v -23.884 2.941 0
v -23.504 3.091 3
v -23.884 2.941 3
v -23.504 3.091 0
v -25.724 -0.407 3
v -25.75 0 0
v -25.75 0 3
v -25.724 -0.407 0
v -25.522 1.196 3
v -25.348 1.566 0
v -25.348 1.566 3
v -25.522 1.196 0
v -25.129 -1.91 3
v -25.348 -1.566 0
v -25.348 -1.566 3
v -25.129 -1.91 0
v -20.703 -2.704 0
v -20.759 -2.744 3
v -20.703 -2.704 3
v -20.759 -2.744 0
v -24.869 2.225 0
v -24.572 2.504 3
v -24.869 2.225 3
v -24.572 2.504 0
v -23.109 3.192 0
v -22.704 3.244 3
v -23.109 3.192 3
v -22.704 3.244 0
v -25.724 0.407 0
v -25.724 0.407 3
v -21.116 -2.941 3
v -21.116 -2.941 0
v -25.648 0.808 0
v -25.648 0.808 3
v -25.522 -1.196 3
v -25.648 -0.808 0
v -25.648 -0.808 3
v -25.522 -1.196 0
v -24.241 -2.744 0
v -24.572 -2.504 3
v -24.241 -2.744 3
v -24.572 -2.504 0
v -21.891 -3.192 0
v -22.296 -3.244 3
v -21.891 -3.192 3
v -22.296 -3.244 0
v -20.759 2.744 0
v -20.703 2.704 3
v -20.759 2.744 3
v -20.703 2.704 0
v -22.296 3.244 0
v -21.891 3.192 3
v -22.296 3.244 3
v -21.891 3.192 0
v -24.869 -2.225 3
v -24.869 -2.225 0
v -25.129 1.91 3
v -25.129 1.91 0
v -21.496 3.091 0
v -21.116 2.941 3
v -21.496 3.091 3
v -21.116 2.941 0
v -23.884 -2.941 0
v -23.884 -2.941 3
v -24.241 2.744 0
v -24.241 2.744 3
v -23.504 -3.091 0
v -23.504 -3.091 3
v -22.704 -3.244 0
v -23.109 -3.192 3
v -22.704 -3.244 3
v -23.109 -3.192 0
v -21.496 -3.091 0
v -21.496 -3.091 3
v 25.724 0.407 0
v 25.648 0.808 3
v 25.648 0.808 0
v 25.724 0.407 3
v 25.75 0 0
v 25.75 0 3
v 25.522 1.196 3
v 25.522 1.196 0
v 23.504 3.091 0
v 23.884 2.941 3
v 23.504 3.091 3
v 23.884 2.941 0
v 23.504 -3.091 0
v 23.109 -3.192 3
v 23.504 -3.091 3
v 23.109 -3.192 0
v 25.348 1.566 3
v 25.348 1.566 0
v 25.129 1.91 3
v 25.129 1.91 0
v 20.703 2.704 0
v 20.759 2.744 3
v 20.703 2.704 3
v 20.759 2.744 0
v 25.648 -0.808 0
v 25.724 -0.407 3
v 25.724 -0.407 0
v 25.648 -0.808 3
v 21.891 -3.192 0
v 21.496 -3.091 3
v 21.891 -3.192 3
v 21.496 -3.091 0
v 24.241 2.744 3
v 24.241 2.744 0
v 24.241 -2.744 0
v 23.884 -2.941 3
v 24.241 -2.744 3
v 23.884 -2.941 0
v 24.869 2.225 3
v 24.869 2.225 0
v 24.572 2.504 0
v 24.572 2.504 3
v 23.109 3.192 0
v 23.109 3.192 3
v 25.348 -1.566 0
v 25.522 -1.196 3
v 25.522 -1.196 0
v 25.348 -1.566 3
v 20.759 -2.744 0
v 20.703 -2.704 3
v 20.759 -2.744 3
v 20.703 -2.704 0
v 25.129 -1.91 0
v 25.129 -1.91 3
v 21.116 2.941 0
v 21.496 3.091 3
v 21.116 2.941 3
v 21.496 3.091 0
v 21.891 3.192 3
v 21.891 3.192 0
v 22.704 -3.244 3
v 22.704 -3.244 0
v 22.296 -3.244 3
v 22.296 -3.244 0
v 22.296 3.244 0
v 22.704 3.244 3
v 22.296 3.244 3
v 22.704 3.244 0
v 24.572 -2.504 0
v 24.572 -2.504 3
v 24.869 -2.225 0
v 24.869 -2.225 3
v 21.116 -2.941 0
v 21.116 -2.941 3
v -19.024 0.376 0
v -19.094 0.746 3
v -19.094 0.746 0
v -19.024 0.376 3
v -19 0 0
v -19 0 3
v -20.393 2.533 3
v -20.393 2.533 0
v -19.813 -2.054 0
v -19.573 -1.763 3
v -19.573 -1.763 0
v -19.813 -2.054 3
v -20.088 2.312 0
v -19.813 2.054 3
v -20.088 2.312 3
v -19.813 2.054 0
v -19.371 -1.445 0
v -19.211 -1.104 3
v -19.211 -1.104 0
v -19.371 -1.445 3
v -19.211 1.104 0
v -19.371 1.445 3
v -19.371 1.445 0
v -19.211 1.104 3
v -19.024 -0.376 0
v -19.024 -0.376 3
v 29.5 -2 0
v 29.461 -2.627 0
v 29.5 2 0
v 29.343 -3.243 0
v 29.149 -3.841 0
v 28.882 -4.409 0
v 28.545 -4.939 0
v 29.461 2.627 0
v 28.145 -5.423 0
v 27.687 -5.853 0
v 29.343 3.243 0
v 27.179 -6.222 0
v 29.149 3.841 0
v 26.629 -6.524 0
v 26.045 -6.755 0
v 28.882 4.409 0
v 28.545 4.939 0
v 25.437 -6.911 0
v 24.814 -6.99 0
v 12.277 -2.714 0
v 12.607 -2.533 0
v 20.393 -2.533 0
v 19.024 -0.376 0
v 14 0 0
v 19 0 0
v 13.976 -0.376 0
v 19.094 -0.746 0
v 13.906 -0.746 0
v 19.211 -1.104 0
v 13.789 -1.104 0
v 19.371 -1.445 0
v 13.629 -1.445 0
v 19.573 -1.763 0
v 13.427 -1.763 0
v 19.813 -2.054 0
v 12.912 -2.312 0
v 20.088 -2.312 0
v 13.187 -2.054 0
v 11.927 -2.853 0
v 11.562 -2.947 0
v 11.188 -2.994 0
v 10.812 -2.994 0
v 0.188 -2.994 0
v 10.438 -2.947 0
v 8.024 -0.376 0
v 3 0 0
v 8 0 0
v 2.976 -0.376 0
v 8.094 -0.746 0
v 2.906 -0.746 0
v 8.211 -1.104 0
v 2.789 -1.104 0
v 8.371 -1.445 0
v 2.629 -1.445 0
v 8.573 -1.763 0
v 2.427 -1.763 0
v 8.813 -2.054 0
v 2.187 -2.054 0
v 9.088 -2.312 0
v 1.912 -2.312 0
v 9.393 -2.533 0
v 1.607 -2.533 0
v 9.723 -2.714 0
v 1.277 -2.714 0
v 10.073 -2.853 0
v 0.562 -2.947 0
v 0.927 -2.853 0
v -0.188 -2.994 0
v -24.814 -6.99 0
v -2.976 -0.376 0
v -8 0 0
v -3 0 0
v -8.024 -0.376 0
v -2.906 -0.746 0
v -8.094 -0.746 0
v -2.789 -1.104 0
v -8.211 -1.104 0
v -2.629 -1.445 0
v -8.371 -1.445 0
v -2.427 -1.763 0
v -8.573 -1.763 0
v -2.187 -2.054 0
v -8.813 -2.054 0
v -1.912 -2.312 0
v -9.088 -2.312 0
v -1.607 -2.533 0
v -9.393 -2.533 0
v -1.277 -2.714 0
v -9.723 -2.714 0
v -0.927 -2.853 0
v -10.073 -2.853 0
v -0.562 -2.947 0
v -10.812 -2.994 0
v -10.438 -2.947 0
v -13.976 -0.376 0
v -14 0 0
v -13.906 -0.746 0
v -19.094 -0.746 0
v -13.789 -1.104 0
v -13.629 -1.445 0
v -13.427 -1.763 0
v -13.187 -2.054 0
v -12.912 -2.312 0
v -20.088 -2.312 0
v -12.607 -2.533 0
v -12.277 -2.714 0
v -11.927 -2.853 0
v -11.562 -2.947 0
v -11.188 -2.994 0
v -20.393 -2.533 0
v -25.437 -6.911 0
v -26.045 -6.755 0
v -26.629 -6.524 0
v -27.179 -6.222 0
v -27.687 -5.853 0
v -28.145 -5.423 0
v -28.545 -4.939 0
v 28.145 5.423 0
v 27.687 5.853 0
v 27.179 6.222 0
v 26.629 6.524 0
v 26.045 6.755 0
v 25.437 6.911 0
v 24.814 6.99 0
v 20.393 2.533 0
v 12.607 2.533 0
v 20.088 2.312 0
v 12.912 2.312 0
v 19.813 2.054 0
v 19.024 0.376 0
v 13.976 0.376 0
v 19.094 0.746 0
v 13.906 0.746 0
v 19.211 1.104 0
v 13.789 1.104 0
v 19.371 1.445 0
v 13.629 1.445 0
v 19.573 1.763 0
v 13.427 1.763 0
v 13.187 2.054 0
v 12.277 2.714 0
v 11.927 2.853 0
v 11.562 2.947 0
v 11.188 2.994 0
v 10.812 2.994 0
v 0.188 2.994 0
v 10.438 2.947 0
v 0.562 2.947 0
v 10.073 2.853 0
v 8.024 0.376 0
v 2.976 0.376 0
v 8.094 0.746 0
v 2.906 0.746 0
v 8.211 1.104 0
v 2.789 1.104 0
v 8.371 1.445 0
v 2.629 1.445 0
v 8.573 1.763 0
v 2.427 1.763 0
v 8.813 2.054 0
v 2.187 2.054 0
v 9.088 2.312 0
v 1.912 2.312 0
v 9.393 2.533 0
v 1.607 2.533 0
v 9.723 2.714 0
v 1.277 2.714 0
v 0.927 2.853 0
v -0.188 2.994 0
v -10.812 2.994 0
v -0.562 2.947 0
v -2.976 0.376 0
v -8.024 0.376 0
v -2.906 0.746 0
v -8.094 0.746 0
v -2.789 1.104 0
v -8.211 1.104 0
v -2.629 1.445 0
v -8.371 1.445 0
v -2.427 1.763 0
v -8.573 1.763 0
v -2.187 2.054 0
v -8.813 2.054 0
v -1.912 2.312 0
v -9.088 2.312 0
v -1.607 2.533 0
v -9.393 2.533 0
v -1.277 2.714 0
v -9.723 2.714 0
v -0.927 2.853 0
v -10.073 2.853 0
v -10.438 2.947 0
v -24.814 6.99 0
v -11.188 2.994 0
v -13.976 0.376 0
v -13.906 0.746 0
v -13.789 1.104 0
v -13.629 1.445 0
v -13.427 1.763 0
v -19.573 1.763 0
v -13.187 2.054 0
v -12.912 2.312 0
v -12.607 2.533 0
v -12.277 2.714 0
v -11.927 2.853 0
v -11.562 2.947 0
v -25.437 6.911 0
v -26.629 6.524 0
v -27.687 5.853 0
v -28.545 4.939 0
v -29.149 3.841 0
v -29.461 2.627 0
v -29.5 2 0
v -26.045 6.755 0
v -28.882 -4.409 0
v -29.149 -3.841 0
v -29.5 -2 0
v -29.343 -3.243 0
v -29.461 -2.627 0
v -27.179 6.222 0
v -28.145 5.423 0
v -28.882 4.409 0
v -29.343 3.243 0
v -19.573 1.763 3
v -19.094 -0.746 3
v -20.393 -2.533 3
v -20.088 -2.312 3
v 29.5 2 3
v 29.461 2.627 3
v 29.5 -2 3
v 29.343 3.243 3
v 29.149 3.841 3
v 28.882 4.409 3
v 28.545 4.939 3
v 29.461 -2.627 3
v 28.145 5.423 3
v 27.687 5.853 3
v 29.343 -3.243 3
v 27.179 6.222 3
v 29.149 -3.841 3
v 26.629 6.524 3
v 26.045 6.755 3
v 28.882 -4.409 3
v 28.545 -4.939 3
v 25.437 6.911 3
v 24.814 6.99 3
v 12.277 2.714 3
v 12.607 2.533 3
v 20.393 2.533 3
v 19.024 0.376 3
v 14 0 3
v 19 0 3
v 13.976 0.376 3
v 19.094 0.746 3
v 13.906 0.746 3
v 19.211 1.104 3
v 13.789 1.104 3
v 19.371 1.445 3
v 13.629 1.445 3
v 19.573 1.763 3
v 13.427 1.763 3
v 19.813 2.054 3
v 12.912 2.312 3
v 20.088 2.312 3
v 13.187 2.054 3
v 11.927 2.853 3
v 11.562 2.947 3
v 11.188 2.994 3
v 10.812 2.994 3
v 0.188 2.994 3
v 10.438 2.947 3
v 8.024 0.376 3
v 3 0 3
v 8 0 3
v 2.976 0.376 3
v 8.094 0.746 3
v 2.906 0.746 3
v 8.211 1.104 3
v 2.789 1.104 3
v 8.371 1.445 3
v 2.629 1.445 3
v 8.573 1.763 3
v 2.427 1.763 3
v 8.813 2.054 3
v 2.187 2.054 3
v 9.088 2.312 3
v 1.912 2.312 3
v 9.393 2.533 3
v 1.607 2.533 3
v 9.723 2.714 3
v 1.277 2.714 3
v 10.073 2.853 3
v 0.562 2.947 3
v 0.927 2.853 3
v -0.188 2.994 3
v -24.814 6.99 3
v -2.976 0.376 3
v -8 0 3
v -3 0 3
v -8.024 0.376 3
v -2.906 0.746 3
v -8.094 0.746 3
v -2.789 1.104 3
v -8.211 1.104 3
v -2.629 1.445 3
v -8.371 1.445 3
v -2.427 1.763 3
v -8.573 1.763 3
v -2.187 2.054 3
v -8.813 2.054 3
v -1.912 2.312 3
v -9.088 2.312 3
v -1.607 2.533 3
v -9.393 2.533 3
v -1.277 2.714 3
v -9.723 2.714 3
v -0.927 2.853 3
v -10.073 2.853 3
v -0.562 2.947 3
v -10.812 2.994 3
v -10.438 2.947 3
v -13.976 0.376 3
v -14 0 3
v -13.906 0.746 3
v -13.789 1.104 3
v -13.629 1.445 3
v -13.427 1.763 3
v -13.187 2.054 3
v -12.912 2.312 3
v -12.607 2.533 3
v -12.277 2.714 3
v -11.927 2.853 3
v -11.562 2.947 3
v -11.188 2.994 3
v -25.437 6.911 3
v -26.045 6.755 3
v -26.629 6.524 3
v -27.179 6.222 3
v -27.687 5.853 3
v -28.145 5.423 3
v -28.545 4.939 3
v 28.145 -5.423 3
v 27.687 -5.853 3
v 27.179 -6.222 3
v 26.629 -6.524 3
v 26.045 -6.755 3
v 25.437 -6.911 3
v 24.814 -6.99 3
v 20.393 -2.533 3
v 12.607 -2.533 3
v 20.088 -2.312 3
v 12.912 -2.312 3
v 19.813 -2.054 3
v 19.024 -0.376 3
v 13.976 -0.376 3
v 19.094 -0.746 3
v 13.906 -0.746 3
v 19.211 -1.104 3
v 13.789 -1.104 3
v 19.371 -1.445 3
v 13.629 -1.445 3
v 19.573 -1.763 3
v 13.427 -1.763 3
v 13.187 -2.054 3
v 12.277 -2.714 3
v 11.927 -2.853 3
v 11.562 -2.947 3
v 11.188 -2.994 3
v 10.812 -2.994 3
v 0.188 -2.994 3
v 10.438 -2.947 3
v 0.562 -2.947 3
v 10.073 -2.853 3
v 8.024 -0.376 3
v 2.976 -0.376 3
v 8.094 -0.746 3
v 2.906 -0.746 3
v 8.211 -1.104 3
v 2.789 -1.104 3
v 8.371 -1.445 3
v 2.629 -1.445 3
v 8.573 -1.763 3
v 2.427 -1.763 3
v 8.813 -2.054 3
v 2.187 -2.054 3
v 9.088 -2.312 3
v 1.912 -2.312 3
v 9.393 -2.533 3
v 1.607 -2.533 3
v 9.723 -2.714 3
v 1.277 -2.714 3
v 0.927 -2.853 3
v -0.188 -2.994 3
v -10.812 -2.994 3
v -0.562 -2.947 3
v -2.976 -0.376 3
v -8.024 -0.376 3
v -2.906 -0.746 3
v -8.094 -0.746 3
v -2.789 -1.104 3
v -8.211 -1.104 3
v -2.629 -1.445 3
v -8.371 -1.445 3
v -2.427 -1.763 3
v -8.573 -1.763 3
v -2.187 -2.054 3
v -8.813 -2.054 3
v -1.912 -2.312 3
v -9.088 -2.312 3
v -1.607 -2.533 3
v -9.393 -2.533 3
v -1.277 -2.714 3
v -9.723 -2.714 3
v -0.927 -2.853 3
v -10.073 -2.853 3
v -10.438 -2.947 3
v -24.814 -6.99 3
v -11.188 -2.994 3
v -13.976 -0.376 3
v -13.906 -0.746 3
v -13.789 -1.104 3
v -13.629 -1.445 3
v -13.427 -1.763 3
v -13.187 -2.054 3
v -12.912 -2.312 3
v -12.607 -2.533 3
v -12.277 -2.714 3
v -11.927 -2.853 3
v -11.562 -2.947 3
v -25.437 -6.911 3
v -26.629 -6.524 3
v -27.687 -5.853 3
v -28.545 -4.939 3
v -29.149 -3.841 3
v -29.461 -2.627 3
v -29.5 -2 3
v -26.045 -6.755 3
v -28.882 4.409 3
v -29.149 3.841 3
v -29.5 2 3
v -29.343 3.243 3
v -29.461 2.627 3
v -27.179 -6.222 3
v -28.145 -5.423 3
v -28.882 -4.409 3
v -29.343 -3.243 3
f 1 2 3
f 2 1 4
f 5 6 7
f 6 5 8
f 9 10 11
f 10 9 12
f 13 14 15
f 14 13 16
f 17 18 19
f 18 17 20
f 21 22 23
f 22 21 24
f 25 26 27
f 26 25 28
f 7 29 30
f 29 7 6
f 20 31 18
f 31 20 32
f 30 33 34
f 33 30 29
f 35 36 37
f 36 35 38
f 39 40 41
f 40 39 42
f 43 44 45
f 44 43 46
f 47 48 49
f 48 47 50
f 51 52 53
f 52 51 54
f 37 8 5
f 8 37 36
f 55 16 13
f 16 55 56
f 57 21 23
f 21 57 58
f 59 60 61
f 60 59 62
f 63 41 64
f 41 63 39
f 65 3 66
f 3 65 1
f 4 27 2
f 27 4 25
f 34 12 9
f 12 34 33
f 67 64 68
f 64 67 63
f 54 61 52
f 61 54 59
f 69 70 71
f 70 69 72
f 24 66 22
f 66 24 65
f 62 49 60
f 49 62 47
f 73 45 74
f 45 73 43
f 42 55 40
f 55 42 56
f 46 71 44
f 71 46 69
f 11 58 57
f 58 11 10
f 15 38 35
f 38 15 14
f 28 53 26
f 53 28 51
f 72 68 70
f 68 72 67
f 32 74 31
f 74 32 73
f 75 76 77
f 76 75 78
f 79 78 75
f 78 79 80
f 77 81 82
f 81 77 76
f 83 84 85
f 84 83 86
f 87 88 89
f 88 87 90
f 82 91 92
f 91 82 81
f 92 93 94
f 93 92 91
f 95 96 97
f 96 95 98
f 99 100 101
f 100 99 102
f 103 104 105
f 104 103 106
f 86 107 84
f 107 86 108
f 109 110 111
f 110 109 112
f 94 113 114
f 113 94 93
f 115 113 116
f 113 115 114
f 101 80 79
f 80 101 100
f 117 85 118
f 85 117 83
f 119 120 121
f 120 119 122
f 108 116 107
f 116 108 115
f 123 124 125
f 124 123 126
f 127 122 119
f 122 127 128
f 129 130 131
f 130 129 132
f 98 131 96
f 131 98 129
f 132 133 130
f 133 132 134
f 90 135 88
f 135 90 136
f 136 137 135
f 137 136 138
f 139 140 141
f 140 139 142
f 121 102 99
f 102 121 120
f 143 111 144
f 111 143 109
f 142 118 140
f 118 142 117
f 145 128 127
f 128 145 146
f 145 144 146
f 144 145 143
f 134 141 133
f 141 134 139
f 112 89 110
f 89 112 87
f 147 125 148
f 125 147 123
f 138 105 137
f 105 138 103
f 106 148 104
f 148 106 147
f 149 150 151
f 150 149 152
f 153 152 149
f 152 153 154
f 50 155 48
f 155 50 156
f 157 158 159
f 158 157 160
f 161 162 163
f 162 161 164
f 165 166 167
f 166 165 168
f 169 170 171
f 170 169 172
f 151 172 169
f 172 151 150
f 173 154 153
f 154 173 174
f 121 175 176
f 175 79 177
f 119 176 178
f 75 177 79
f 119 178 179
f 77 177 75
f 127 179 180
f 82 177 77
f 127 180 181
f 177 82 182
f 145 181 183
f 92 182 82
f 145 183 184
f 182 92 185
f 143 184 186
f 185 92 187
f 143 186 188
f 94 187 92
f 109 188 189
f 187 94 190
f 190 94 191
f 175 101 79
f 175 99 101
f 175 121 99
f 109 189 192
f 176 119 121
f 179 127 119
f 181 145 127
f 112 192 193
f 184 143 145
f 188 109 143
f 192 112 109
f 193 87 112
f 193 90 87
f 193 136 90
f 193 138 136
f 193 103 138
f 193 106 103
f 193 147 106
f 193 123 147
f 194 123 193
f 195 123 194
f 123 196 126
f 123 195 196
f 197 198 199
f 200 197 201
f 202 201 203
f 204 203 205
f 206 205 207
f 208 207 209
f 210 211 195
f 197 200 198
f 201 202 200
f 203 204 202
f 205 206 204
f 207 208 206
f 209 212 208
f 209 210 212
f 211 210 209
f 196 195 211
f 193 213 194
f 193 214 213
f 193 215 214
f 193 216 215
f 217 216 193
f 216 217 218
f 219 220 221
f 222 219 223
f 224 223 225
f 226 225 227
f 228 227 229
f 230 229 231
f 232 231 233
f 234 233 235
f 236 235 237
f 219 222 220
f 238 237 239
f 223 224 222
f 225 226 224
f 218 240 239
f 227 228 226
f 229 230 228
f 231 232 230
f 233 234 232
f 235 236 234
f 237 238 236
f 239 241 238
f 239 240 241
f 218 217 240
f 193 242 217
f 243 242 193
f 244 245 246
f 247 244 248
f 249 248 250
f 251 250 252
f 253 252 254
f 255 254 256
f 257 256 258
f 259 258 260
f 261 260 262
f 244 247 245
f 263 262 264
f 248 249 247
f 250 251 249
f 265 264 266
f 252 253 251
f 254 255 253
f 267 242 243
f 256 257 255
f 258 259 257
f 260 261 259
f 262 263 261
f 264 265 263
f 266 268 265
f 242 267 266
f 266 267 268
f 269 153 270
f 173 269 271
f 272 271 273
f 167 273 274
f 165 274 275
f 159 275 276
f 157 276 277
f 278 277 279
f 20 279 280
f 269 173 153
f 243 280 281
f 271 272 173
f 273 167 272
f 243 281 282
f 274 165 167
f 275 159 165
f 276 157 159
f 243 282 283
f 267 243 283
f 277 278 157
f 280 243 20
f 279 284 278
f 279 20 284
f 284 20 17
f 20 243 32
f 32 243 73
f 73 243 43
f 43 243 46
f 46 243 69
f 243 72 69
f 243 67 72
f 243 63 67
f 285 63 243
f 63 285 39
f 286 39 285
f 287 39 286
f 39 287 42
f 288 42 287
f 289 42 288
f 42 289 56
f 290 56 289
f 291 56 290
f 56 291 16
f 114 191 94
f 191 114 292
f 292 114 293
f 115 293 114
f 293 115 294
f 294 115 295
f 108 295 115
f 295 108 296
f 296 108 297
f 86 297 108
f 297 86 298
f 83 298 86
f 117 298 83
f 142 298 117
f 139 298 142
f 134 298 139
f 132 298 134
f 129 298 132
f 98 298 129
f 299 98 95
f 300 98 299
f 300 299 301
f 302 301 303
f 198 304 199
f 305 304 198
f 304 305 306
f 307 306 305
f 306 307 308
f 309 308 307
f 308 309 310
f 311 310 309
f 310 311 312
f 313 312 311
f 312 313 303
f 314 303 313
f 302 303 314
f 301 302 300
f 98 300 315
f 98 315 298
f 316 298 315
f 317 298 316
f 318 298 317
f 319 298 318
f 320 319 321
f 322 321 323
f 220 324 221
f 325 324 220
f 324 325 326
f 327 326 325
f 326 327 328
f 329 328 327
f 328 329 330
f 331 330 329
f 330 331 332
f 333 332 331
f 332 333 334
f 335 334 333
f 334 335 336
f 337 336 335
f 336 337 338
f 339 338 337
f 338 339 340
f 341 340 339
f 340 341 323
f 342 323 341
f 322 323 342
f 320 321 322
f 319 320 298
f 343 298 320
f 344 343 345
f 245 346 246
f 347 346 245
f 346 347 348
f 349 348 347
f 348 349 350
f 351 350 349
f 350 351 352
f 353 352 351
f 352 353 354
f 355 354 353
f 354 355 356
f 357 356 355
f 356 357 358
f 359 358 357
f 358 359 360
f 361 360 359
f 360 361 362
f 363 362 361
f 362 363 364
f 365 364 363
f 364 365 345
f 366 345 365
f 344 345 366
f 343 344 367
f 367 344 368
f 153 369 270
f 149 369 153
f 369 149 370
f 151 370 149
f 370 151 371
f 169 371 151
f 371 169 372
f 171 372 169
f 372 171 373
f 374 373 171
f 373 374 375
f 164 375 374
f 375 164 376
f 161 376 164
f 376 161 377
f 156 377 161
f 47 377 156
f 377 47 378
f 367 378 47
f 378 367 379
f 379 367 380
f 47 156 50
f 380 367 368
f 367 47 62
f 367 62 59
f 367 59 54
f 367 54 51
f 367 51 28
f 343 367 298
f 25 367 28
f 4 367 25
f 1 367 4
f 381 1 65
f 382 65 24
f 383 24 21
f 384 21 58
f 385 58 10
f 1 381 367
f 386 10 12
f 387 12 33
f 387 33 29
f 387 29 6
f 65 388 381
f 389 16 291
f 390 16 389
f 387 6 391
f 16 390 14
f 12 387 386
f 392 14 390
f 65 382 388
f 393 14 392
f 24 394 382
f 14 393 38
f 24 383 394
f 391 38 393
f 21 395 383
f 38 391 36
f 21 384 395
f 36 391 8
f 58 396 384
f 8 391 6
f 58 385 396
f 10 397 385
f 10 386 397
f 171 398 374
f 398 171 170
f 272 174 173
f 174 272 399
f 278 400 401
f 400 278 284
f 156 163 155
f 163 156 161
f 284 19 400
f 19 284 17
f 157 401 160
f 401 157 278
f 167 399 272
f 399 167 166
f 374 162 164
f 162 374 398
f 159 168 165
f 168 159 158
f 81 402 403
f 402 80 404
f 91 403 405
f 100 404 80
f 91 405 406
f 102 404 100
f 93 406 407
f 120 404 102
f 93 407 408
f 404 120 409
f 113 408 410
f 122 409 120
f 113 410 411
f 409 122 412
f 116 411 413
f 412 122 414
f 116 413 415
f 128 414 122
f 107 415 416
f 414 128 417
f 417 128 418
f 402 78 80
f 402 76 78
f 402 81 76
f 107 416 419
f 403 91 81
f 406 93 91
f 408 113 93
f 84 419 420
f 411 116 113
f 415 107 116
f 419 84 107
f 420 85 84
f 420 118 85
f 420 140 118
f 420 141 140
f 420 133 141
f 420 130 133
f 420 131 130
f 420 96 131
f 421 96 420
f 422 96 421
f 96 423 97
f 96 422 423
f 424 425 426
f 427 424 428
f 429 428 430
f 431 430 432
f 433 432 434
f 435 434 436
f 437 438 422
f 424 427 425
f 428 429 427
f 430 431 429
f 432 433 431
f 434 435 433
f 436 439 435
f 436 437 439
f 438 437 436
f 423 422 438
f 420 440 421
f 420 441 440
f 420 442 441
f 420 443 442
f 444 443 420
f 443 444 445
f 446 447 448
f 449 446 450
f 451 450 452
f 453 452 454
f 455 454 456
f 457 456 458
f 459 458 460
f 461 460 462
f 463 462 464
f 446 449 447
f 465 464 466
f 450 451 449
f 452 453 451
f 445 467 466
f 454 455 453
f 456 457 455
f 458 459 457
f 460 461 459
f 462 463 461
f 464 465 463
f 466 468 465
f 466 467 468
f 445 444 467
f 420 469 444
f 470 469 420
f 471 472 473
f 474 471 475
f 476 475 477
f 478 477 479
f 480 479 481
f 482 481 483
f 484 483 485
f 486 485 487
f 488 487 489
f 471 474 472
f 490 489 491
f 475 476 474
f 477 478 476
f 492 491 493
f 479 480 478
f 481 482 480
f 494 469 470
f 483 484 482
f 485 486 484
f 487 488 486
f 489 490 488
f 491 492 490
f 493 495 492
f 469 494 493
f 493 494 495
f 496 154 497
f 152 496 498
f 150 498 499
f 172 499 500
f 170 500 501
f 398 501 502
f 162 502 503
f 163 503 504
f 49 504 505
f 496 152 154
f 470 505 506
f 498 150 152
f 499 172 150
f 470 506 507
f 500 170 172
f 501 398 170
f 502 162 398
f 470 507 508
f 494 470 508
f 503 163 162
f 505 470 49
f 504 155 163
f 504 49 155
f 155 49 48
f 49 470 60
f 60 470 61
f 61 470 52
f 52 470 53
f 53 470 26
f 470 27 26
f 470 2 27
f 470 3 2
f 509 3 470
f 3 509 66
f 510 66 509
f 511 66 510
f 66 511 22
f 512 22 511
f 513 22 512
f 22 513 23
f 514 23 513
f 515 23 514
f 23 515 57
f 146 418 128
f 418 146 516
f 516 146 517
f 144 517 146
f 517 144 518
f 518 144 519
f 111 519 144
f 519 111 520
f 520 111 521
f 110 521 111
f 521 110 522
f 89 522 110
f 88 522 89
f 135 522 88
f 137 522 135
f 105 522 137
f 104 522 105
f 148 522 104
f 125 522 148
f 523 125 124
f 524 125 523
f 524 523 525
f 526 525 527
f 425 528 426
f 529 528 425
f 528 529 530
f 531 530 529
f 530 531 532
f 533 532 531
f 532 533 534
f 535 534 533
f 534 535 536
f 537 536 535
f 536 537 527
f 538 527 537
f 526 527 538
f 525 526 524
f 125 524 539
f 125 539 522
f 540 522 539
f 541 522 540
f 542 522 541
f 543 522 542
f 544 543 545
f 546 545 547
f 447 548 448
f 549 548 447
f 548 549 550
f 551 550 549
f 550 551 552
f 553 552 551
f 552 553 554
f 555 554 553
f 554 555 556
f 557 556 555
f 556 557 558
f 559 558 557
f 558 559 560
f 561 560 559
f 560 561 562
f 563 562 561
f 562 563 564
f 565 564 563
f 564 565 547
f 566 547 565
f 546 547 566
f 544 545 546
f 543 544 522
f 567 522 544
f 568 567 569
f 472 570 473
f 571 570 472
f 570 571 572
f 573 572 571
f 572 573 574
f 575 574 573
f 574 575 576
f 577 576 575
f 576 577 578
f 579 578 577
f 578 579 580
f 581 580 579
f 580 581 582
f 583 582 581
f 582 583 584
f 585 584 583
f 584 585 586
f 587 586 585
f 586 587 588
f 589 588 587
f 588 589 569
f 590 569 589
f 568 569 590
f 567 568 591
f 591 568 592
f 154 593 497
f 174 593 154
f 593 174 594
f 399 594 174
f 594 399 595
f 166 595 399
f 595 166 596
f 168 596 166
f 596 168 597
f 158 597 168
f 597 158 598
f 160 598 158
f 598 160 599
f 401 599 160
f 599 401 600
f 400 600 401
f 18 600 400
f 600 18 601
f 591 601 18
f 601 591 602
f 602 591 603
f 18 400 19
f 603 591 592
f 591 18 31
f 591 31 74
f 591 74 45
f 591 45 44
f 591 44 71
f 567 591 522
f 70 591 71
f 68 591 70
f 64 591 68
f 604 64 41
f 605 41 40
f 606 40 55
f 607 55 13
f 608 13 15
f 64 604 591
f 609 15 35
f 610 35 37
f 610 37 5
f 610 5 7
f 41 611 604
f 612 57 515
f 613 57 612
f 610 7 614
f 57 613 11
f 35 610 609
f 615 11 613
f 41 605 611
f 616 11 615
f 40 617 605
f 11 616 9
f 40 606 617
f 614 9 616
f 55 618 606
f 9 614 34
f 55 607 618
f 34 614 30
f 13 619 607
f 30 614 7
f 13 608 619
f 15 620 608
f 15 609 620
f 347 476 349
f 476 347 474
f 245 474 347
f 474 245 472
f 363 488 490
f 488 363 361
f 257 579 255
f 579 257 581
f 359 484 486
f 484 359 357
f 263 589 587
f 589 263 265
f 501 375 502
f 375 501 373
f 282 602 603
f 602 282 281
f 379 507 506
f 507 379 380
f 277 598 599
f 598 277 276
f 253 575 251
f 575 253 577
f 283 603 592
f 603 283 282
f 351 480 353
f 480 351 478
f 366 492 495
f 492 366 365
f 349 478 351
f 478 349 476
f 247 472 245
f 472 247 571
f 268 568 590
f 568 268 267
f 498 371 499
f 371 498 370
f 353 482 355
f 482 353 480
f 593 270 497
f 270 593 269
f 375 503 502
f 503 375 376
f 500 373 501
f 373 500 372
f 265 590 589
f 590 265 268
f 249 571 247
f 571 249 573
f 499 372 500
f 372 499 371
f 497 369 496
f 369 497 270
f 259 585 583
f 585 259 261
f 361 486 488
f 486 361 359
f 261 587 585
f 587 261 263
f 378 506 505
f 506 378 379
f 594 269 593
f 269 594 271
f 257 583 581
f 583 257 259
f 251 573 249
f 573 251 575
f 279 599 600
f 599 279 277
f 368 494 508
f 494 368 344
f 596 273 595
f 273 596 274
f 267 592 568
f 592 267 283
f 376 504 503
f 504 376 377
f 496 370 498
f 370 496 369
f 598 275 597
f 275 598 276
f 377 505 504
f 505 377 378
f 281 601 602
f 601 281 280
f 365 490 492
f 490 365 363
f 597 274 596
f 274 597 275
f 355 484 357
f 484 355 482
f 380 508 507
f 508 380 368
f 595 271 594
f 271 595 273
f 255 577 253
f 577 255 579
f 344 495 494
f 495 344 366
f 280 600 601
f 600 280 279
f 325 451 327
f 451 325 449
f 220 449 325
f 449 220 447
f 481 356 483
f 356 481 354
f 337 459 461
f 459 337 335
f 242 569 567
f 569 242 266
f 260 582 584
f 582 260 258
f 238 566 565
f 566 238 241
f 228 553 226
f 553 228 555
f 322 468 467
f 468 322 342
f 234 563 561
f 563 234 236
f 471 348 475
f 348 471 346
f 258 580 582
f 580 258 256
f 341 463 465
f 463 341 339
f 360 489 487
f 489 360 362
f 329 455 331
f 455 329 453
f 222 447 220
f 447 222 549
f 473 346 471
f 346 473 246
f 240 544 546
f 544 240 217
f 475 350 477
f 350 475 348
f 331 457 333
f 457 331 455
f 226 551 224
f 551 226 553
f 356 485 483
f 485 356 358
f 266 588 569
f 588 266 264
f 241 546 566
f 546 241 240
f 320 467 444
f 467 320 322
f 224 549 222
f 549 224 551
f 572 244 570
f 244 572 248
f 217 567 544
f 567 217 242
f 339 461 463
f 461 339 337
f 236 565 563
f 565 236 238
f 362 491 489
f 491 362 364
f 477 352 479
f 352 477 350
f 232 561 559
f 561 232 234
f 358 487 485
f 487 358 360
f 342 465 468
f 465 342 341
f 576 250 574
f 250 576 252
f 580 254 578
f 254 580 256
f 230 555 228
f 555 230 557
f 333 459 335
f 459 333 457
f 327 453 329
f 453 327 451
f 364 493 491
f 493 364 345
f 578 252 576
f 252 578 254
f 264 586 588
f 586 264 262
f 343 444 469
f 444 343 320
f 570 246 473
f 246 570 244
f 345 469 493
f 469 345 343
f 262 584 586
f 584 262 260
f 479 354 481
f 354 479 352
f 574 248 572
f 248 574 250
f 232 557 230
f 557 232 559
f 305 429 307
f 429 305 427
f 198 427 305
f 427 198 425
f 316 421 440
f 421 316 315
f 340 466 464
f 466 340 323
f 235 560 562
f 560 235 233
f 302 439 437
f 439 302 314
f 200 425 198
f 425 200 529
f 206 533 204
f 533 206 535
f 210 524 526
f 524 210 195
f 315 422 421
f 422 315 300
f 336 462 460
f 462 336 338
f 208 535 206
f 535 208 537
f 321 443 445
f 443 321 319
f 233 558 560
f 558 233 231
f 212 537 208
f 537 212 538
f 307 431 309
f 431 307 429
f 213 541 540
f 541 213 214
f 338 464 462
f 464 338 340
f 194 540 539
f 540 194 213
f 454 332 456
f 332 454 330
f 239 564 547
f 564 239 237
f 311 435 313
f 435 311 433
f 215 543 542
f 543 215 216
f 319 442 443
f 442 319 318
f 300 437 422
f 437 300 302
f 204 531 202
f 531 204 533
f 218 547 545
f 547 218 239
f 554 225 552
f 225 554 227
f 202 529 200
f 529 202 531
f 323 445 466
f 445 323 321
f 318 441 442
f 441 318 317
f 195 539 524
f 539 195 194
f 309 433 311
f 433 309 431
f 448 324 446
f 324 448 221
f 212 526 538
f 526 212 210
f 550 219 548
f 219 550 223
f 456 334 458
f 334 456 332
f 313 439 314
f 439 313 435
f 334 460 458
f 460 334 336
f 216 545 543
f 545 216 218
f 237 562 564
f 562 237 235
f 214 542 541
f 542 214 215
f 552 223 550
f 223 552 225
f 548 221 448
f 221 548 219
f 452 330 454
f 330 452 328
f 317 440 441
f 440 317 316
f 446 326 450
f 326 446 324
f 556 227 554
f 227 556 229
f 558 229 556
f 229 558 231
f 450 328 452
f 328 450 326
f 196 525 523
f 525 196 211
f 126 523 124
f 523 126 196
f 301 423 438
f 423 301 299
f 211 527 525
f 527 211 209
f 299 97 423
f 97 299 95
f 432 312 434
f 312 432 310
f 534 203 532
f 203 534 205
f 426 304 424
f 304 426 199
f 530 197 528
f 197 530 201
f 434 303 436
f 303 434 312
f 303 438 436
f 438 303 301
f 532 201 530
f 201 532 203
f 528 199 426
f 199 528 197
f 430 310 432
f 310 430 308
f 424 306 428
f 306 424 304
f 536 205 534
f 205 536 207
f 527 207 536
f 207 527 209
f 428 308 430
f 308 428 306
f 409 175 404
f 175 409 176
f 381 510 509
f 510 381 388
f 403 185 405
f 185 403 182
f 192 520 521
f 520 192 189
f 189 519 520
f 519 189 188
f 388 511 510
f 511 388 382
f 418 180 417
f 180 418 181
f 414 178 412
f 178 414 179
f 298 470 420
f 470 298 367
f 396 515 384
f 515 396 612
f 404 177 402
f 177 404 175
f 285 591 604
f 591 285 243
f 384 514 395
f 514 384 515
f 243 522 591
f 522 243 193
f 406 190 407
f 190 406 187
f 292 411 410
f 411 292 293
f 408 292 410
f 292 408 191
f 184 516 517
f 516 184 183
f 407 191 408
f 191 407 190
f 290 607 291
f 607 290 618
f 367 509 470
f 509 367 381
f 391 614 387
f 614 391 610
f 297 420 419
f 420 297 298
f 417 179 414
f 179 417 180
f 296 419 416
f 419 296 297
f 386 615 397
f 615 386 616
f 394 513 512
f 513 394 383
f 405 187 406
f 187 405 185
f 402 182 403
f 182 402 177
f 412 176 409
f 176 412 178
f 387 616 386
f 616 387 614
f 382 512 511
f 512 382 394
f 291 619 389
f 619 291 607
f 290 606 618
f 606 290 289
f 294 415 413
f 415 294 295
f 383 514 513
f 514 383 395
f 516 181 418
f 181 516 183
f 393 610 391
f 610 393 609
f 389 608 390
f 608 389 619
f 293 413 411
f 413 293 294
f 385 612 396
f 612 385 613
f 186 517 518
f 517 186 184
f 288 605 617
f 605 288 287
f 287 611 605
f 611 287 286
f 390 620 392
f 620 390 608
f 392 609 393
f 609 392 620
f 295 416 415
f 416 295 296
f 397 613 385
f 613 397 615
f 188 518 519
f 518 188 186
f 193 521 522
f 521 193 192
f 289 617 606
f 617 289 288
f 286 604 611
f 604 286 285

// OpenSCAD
$fn = 50;


difference() {
	union() {
		hull() {
			translate(v = [-24.5000000000, 2.0000000000, 0]) {
				cylinder(h = 3, r = 5);
			}
			translate(v = [24.5000000000, 2.0000000000, 0]) {
				cylinder(h = 3, r = 5);
			}
			translate(v = [-24.5000000000, -2.0000000000, 0]) {
				cylinder(h = 3, r = 5);
			}
			translate(v = [24.5000000000, -2.0000000000, 0]) {
				cylinder(h = 3, r = 5);
			}
		}
	}
	union() {
		#translate(v = [-22.5000000000, 0.0000000000, -100.0000000000]) {
			cylinder(h = 200, r = 3.2500000000);
		}
		#translate(v = [-22.5000000000, 0.0000000000, -100.0000000000]) {
			cylinder(h = 200, r = 3.2500000000);
		}
		#translate(v = [22.5000000000, 0.0000000000, -100.0000000000]) {
			cylinder(h = 200, r = 3.2500000000);
		}
		#translate(v = [22.5000000000, 0.0000000000, -100.0000000000]) {
			cylinder(h = 200, r = 3.2500000000);
		}
		#translate(v = [-22.0000000000, 0, 0]) {
			cylinder(h = 3, r = 3.0000000000);
		}
		#translate(v = [-11.0000000000, 0, 0]) {
			cylinder(h = 3, r = 3.0000000000);
		}
		#cylinder(h = 3, r = 3.0000000000);
		#translate(v = [11.0000000000, 0, 0]) {
			cylinder(h = 3, r = 3.0000000000);
		}
		#translate(v = [22.0000000000, 0, 0]) {
			cylinder(h = 3, r = 3.0000000000);
		}
	}
}
